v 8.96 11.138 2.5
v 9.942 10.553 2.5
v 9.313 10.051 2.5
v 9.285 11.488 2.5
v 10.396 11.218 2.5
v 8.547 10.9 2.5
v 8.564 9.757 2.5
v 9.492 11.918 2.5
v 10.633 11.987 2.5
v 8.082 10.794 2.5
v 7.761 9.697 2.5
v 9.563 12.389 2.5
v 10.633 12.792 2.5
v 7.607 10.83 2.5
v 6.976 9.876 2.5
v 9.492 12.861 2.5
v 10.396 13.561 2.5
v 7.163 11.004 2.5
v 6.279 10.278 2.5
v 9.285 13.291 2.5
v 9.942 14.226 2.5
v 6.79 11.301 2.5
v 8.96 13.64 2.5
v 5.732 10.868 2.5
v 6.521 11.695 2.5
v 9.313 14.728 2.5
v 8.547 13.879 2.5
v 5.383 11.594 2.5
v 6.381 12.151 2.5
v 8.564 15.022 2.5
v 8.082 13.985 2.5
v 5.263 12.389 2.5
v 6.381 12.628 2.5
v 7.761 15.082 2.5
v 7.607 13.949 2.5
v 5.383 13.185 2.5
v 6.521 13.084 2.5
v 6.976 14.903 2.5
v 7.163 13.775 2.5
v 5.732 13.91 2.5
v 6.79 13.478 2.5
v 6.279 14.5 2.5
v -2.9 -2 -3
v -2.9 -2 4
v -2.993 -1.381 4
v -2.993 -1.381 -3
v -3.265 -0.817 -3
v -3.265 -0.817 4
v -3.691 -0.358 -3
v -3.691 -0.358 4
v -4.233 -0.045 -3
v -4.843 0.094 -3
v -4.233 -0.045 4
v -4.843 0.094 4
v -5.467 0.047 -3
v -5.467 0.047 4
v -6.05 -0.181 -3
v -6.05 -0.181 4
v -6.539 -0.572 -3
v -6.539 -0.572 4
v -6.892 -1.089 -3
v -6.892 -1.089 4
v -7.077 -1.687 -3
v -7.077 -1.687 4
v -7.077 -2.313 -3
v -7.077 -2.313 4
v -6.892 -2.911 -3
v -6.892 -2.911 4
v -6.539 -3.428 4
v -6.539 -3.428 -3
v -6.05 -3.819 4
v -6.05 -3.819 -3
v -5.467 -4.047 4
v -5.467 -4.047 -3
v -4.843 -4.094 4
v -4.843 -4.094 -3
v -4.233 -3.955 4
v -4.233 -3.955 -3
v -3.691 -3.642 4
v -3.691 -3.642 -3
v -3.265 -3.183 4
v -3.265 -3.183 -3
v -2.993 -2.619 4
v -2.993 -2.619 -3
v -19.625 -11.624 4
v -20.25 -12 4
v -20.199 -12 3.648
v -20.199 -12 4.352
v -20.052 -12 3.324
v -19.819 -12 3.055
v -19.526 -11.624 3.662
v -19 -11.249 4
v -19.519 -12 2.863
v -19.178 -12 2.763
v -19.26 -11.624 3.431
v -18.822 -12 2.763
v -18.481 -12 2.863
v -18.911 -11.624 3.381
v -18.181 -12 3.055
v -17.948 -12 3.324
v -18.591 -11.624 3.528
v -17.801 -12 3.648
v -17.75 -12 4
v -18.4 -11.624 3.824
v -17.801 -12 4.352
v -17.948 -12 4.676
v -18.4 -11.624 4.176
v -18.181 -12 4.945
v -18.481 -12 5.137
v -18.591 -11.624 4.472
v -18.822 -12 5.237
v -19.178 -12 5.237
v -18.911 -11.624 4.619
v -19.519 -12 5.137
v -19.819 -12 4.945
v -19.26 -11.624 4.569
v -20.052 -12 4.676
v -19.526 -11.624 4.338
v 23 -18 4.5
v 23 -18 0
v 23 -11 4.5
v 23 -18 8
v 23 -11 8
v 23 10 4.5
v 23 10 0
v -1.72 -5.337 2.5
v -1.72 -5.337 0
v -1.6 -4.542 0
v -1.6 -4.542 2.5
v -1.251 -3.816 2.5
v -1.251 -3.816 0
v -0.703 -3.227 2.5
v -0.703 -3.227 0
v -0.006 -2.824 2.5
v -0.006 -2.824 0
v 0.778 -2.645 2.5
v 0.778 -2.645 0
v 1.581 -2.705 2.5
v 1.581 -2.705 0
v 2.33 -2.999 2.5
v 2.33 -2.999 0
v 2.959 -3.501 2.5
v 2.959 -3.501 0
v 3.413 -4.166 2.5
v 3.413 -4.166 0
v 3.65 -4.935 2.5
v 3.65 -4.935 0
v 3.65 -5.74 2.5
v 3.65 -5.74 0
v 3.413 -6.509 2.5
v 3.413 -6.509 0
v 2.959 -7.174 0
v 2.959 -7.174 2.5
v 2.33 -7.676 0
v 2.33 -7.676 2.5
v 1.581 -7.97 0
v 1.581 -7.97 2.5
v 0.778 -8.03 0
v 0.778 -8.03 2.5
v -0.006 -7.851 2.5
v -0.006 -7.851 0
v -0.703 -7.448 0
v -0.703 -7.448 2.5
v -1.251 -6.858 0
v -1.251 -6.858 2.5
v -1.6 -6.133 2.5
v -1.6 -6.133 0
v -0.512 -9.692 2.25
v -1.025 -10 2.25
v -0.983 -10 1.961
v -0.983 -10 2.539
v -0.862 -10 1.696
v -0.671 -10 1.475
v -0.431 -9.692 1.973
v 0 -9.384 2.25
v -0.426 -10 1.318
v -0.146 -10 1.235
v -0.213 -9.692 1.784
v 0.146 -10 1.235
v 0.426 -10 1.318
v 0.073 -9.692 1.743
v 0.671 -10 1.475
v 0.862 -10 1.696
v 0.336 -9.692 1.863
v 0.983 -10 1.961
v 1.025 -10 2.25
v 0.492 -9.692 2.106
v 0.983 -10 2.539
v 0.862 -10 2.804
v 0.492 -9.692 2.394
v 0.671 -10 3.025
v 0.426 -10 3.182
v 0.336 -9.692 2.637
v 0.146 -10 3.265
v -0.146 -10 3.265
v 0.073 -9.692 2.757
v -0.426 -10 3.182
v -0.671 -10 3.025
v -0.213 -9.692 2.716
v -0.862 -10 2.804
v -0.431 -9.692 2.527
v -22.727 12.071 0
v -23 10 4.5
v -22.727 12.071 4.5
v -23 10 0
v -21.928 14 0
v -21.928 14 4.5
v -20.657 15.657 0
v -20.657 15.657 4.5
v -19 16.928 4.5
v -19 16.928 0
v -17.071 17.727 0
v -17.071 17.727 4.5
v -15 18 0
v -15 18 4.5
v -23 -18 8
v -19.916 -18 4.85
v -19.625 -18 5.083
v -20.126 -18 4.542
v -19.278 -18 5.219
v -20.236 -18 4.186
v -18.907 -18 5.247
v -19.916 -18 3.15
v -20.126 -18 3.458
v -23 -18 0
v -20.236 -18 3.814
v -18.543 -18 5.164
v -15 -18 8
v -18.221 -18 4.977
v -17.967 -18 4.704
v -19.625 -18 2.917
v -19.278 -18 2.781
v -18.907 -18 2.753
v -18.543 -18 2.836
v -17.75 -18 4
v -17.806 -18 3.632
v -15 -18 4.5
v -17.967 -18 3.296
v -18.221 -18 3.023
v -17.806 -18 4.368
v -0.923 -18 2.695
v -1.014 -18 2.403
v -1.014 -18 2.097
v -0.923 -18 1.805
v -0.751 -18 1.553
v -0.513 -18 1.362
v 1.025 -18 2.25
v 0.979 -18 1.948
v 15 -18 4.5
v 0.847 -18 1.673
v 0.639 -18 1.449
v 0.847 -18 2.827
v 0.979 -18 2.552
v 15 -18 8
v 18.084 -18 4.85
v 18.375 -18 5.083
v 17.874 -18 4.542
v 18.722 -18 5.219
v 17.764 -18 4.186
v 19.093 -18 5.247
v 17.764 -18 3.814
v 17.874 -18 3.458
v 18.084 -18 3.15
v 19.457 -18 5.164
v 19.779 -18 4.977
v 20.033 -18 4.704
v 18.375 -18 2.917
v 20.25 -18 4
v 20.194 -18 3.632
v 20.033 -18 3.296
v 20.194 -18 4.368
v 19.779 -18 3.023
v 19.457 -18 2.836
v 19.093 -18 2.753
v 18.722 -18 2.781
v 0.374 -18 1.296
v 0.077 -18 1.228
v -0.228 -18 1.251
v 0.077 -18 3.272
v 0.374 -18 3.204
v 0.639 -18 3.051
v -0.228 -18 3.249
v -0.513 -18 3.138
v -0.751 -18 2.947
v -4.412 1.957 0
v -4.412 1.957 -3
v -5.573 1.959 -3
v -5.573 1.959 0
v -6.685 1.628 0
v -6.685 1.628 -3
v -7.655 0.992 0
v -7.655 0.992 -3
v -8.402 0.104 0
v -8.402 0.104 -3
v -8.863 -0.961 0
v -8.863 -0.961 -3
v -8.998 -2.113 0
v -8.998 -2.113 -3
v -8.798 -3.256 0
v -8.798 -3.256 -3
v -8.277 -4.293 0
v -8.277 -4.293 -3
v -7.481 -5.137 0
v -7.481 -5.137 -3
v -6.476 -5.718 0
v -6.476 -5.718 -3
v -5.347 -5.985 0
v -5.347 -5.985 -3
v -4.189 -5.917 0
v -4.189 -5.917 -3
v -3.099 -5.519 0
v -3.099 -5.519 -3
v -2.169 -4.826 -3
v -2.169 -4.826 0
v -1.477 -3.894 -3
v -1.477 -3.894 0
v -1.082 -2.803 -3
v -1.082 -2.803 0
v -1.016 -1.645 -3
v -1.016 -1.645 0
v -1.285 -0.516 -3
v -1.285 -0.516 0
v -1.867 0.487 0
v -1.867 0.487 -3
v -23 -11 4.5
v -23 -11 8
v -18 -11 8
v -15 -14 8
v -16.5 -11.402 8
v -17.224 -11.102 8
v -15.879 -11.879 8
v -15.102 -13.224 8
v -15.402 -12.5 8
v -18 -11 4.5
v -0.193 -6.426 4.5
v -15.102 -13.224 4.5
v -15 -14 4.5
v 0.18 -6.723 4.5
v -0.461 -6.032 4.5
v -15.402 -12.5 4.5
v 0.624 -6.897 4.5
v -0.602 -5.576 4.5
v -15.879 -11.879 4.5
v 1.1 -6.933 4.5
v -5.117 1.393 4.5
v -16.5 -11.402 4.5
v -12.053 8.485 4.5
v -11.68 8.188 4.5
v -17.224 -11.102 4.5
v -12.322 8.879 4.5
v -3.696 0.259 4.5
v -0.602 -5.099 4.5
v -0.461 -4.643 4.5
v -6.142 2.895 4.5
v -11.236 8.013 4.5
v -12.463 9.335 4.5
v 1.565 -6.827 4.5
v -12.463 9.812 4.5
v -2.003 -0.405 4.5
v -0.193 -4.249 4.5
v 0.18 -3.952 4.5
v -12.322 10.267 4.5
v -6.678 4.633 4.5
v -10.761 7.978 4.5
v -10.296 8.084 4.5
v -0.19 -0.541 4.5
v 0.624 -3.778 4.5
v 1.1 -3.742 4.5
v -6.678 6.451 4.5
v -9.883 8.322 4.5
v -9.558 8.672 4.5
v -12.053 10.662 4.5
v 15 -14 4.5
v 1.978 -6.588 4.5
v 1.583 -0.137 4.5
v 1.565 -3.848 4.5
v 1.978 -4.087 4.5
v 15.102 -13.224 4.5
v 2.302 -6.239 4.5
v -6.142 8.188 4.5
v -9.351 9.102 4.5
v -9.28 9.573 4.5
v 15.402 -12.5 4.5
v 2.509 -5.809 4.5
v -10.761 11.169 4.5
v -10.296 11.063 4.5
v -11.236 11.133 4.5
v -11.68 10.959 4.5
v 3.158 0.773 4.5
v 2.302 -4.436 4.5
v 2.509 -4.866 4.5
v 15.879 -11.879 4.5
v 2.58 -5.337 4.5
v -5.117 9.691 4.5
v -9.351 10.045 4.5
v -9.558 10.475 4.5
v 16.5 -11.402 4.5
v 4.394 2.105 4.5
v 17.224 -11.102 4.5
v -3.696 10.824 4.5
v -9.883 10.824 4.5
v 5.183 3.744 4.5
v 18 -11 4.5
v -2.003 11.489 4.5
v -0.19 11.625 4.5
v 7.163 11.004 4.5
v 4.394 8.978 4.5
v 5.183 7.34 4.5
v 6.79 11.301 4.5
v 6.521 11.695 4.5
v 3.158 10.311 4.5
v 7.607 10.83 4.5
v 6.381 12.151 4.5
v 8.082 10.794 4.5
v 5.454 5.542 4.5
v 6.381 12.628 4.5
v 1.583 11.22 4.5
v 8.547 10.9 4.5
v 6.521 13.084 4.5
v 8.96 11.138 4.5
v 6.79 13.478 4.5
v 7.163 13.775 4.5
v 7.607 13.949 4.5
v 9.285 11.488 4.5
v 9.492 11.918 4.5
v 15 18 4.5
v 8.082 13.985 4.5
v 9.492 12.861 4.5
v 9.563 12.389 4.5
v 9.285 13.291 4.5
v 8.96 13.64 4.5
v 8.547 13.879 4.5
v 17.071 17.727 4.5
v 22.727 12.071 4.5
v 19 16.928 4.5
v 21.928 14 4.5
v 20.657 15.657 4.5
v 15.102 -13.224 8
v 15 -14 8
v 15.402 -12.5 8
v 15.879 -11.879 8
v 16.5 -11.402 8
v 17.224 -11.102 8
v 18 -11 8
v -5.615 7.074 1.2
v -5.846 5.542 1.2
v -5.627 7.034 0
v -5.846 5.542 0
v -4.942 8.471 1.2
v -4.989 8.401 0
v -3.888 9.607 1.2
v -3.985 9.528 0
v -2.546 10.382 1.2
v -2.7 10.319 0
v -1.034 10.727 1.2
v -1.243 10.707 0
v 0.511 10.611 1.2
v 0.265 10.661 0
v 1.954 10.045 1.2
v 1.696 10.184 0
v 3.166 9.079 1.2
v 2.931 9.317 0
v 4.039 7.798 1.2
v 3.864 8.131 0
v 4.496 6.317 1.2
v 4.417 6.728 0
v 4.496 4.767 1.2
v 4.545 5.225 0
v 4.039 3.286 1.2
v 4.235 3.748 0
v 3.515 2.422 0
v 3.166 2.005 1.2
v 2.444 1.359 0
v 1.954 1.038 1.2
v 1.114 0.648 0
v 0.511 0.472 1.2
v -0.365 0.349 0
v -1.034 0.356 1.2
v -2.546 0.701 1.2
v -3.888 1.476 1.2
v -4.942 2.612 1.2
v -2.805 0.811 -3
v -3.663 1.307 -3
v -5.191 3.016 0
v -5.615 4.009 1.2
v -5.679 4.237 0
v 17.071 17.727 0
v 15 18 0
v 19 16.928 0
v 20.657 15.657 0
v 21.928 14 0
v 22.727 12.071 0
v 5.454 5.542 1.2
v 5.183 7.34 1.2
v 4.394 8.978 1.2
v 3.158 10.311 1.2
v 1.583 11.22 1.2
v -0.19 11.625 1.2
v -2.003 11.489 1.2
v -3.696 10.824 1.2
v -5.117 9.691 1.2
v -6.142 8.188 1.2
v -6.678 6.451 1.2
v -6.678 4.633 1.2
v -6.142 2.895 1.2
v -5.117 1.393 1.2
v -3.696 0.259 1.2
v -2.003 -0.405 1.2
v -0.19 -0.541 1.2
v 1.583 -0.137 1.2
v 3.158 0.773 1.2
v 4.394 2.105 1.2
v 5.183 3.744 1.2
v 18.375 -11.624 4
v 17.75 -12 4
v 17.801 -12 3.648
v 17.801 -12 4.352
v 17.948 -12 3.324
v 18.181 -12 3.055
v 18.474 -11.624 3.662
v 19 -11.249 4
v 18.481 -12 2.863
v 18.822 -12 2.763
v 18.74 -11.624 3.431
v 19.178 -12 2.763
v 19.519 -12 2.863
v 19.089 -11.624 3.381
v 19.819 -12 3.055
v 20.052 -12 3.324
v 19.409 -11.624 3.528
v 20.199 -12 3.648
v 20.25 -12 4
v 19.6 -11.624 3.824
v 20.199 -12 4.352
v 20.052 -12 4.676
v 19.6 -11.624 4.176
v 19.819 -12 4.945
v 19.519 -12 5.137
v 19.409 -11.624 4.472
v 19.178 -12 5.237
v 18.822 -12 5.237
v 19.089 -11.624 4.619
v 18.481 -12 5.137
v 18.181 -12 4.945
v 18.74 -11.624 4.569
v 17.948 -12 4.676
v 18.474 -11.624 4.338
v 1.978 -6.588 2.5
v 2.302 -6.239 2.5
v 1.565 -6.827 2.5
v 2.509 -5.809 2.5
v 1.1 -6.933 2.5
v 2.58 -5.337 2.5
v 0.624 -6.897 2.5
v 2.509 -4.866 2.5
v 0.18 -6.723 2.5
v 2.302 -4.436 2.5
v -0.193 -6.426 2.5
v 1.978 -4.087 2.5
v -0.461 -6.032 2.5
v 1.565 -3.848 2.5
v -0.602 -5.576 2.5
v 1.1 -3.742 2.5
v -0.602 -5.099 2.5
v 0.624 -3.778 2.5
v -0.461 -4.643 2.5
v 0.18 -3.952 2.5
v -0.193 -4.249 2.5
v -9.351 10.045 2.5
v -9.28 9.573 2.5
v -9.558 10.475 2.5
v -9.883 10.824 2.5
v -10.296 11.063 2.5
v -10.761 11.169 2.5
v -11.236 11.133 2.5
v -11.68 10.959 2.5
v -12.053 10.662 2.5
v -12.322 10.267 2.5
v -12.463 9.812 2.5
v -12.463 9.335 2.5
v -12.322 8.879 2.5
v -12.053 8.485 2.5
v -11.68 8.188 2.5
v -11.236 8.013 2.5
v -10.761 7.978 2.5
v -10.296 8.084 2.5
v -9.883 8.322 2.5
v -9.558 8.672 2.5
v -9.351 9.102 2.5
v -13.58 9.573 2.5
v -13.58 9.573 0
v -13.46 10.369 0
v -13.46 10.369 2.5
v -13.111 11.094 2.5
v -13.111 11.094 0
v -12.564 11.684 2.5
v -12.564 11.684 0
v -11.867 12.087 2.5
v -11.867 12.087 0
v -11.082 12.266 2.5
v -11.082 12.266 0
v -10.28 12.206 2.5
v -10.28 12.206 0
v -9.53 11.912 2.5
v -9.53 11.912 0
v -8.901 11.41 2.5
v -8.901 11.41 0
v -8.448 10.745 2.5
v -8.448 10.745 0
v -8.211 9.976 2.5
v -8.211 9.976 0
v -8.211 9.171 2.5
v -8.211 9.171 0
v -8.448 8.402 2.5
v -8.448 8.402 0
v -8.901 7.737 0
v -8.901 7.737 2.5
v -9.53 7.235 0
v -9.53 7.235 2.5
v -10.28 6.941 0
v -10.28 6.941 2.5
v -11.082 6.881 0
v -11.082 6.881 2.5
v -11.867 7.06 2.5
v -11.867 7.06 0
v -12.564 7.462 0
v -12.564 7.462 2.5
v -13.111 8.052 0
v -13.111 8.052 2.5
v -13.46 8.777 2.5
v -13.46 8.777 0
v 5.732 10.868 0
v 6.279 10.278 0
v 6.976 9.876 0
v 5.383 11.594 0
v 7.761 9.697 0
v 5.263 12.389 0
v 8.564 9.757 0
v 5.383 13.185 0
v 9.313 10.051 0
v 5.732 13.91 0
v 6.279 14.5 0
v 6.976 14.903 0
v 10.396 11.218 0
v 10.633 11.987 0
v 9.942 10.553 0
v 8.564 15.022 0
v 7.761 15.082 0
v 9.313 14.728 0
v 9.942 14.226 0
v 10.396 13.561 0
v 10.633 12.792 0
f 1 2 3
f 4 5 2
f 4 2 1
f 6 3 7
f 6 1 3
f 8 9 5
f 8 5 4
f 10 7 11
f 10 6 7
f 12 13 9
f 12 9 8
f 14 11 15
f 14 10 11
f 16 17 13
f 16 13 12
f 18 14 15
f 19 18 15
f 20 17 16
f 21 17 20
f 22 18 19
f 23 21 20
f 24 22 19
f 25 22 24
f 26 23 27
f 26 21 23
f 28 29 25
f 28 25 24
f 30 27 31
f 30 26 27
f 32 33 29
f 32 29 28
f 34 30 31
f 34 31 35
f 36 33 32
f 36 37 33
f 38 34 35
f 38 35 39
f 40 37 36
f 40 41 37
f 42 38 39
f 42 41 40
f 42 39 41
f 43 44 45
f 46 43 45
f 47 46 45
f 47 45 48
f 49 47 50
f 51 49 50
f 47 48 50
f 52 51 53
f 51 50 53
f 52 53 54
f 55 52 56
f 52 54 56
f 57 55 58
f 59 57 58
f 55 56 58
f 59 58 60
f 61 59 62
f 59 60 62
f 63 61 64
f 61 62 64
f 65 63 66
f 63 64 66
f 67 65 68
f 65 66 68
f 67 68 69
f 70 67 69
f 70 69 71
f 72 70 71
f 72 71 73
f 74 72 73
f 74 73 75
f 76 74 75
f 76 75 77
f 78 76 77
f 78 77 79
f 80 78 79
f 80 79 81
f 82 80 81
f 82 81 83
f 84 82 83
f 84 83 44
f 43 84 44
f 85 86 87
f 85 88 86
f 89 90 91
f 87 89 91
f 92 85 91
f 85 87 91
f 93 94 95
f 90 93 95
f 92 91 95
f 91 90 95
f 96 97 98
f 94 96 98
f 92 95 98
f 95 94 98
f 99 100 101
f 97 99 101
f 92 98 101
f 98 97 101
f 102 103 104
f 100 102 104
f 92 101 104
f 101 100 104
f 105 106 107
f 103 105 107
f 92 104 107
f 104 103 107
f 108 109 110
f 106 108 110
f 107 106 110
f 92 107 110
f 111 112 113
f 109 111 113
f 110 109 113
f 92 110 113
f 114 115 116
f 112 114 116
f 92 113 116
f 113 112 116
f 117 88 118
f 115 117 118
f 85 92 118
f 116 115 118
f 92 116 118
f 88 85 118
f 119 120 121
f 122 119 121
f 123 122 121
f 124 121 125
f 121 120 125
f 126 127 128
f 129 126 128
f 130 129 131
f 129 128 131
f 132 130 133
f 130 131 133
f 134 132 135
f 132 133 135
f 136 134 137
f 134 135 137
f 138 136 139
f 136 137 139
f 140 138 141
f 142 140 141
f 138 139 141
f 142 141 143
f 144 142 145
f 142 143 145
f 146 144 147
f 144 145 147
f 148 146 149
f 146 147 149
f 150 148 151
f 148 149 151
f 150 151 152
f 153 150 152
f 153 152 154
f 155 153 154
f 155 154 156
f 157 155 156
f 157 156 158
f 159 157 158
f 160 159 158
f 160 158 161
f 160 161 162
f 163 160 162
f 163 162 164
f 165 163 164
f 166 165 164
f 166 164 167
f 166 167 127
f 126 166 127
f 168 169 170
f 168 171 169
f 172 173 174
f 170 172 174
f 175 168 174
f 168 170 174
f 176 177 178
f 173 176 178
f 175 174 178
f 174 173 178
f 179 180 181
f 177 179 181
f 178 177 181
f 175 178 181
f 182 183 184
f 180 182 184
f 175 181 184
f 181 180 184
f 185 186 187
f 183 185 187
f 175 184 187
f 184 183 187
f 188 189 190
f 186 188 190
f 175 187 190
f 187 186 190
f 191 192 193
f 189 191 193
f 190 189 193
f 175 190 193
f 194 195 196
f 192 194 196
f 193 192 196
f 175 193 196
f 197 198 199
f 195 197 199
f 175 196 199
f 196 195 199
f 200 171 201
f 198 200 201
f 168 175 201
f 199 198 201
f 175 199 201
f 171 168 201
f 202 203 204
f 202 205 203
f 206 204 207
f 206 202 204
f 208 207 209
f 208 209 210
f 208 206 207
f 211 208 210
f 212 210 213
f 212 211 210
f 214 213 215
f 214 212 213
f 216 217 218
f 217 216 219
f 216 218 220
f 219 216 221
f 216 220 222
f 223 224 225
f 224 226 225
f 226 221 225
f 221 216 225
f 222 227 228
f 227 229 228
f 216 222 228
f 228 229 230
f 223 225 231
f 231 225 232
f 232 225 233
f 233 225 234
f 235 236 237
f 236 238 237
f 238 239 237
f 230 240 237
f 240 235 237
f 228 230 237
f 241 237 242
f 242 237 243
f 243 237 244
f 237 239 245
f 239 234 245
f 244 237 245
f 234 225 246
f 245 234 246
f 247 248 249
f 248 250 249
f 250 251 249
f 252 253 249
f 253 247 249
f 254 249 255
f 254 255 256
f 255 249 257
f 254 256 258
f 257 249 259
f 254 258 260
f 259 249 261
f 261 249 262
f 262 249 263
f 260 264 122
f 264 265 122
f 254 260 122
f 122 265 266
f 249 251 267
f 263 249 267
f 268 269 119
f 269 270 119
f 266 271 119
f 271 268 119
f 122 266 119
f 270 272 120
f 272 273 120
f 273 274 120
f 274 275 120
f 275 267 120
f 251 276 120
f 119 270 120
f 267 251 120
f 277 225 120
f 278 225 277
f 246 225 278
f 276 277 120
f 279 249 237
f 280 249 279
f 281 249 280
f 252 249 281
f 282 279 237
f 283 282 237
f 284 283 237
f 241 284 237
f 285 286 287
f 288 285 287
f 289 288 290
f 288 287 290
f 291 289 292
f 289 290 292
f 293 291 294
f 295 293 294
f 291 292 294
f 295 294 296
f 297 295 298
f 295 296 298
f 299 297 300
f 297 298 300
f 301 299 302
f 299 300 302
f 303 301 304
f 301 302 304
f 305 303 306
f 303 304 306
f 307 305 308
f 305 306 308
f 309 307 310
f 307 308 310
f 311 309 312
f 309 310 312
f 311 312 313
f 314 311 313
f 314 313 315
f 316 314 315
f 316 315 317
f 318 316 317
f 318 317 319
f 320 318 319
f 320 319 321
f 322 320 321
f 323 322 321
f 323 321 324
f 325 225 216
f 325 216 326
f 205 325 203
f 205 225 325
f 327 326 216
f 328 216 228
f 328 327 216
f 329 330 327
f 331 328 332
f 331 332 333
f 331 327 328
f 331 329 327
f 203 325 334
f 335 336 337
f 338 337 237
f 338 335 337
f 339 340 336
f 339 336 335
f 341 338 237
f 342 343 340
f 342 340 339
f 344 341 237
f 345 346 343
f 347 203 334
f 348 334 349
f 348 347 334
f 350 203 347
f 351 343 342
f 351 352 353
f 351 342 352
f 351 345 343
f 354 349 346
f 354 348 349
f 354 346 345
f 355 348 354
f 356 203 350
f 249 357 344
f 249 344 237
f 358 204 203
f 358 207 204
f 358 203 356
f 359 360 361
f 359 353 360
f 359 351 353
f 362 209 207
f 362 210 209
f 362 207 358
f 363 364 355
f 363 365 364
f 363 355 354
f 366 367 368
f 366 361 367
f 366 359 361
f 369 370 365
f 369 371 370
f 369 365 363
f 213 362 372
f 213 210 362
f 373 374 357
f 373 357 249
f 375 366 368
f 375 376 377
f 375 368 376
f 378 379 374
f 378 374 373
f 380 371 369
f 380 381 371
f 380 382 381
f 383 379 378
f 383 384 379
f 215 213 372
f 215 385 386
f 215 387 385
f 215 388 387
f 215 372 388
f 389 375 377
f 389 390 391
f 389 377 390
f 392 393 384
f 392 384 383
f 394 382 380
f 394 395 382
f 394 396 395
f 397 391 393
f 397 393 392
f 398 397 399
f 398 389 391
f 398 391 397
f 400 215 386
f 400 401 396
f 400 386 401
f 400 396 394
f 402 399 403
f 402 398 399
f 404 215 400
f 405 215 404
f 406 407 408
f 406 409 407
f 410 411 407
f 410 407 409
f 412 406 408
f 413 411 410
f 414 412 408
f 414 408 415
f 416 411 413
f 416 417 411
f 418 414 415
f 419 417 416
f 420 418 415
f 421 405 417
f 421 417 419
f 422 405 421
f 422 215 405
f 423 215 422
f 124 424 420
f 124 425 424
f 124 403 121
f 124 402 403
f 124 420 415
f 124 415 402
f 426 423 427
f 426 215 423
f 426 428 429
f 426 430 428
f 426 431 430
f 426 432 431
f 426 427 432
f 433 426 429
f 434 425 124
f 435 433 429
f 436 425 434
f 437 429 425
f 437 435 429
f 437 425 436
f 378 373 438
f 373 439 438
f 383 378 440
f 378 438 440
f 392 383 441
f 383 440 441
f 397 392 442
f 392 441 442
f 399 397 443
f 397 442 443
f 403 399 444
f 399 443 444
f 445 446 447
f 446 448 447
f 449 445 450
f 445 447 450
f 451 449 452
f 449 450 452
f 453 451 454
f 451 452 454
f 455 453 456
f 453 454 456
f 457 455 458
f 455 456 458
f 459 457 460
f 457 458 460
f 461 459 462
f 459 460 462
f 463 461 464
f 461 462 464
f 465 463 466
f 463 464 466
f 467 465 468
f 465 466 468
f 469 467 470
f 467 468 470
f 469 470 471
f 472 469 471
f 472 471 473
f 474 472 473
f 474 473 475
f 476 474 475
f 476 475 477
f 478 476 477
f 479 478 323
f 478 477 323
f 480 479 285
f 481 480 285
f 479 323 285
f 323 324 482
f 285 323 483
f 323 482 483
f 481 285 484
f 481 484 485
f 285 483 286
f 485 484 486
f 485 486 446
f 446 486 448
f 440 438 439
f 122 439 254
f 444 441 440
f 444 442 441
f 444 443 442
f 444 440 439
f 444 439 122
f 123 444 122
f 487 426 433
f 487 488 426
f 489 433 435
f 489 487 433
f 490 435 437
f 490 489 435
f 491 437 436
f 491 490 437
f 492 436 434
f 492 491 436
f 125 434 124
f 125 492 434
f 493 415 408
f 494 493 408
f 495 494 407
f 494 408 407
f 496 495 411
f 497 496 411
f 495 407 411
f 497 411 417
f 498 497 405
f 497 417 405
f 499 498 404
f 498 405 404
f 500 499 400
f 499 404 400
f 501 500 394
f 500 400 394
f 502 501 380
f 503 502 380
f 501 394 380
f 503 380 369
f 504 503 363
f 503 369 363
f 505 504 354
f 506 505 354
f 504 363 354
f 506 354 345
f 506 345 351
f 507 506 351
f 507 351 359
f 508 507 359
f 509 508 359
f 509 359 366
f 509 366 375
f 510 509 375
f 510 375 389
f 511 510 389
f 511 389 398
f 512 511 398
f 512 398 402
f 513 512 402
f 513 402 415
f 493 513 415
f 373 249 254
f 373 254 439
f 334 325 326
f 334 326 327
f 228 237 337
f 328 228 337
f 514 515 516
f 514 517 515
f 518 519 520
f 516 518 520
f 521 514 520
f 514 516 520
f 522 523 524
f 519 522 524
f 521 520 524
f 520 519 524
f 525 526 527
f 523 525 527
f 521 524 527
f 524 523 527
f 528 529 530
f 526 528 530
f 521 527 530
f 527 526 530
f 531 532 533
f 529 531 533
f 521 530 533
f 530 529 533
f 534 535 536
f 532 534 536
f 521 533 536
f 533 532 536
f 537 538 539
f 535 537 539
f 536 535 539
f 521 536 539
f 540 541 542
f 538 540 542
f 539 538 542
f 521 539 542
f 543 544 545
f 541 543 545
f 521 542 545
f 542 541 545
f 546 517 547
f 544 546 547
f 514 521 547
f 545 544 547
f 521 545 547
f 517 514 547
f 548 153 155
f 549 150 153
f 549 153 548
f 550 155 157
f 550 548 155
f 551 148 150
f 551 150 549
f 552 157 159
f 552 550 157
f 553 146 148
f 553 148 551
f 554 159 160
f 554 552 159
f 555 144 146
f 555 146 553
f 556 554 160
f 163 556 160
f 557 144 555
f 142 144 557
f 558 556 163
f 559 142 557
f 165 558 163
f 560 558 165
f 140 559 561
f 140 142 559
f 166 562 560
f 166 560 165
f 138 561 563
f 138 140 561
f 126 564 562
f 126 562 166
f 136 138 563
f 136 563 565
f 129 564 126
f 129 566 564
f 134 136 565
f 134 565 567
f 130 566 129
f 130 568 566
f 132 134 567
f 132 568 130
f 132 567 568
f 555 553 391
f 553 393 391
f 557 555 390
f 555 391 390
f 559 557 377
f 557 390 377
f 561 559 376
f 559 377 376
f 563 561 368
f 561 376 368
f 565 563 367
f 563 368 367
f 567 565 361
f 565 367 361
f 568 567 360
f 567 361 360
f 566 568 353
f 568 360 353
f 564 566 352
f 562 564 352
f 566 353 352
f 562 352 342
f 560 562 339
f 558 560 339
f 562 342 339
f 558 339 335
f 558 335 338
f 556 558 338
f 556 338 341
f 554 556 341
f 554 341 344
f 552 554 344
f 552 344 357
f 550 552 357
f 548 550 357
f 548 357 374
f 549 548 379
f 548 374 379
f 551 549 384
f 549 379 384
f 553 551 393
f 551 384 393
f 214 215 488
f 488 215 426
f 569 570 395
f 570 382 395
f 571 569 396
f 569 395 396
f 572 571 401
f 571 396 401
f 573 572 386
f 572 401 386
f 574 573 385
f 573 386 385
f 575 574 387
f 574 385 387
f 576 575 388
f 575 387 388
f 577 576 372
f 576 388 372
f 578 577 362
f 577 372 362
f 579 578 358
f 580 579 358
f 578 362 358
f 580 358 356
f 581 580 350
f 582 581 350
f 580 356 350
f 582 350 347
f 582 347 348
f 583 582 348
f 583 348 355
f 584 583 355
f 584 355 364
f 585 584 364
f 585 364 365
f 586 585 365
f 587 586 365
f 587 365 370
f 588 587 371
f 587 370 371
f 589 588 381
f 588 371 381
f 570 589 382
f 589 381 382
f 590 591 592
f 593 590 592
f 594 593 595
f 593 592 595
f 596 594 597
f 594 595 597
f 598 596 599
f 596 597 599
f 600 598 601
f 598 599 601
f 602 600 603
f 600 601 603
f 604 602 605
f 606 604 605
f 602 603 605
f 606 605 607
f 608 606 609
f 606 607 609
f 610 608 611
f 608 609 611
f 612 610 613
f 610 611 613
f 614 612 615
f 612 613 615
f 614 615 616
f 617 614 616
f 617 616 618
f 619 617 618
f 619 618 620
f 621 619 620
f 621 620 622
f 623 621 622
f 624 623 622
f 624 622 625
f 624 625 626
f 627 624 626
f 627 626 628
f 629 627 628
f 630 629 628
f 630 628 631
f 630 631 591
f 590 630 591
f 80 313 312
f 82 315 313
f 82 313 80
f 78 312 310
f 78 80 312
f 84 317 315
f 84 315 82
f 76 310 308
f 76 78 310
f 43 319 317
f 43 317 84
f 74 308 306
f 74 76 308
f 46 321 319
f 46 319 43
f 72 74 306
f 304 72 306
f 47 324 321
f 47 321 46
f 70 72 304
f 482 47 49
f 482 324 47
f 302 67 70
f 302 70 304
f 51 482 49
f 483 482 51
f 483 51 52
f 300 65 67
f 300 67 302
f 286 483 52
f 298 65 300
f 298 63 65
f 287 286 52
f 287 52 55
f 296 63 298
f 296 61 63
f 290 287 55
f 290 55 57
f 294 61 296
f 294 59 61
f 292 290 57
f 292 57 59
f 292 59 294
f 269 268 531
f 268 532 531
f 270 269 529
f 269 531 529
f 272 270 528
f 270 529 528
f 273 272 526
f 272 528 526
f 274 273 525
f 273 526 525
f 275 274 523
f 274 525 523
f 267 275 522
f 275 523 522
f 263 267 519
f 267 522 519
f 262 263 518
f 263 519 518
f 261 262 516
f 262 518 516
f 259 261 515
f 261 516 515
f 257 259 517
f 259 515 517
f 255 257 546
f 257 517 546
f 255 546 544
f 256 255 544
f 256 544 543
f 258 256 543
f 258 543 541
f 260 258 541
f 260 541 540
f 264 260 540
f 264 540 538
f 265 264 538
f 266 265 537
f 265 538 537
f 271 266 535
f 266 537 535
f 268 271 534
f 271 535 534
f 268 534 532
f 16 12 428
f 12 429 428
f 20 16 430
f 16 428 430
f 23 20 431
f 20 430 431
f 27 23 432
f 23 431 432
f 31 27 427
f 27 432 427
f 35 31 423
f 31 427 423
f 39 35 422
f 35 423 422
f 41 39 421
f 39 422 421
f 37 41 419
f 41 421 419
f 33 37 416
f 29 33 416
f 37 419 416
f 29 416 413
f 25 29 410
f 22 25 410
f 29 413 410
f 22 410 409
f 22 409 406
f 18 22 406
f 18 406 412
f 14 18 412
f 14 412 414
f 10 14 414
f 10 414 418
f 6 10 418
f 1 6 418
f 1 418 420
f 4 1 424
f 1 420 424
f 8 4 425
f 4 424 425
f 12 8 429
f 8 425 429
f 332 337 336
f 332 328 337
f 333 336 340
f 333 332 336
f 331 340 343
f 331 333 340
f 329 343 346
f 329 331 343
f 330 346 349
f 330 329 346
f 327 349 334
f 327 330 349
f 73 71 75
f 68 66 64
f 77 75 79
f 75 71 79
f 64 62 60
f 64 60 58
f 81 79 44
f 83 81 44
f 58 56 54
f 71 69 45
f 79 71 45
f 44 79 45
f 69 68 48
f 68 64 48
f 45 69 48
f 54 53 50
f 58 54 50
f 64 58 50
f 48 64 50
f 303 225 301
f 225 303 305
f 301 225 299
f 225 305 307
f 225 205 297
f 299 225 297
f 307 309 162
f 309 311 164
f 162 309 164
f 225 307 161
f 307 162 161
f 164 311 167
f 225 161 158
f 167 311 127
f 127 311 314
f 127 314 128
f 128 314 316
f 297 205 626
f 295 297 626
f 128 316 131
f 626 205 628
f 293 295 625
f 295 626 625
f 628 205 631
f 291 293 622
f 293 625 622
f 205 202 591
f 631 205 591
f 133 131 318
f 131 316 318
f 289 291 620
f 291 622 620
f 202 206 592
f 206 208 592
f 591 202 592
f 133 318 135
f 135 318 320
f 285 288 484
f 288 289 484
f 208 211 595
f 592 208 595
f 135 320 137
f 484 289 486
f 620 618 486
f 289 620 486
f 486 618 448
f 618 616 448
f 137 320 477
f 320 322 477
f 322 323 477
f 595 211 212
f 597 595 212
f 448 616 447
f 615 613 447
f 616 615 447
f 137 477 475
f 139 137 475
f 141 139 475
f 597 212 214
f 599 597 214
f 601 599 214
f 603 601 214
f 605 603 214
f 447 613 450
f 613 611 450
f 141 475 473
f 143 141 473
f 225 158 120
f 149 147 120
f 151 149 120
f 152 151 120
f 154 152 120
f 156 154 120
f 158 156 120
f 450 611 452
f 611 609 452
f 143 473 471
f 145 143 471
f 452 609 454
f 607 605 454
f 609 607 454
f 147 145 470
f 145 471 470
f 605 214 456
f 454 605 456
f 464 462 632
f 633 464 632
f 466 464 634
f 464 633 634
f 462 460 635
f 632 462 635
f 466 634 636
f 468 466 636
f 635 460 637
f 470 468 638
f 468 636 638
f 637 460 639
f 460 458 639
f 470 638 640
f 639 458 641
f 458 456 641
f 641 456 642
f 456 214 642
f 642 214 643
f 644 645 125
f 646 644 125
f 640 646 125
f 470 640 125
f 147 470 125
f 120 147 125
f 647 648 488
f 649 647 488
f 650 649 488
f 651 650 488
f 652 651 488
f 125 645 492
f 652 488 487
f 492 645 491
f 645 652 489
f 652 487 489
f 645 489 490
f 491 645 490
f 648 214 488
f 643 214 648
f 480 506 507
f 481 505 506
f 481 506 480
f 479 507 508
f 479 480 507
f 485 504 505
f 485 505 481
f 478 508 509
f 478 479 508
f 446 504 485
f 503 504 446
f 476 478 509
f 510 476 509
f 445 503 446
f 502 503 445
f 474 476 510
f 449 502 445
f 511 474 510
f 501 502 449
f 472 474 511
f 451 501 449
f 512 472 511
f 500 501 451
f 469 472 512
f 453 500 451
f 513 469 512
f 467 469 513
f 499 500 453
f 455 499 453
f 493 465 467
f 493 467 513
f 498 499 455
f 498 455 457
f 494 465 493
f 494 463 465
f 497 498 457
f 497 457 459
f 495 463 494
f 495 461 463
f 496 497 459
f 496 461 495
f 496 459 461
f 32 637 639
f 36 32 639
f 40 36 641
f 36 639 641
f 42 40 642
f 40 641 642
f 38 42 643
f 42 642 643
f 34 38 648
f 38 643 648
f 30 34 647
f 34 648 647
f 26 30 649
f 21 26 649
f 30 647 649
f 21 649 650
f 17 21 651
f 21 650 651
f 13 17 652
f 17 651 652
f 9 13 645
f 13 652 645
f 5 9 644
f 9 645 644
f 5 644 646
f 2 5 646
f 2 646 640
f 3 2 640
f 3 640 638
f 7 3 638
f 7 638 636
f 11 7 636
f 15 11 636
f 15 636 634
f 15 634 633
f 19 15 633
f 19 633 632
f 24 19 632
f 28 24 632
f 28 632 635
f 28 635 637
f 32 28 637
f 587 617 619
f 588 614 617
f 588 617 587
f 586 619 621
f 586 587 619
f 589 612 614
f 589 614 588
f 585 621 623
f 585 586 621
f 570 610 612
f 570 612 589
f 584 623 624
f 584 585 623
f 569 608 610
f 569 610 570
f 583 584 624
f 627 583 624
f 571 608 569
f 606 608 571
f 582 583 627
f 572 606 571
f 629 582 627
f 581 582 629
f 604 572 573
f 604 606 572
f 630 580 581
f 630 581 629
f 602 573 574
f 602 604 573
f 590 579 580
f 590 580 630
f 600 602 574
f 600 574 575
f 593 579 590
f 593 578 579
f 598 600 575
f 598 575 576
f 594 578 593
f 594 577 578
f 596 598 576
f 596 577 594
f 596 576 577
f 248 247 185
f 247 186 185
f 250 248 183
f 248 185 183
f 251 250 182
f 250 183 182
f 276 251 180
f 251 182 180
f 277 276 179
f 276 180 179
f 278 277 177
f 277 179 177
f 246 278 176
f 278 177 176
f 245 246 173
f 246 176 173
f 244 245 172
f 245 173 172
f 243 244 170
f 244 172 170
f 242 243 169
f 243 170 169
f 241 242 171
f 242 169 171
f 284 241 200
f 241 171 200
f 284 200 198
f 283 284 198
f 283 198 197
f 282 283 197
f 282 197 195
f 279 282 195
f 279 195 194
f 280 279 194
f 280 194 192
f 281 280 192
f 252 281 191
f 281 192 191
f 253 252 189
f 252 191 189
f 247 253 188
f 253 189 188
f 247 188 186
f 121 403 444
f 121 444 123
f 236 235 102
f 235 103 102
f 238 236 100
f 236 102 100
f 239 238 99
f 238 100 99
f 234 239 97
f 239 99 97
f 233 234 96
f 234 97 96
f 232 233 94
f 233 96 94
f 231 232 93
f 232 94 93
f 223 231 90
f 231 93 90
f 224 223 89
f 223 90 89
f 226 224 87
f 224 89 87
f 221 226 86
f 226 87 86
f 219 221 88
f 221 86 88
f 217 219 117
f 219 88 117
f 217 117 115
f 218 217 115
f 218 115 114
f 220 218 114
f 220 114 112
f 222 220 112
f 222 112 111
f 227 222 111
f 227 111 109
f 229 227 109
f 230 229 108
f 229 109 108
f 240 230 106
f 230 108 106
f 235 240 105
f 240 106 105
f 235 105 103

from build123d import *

# Parameters (mm, degrees)
SKETCH1_W                                        = 46
SKETCH1_H                                        = 36
BOSS_EXTRUDE1_DEPTH                              = 4.5
SKETCH2_W                                        = 8
SKETCH2_H                                        = 7
BOSS_EXTRUDE2_DEPTH                              = 3.5
SKETCH3_W                                        = 7.999999995
SKETCH3_H                                        = 7
BOSS_EXTRUDE3_DEPTH                              = 3.5
SKETCH4_W                                        = 4
SKETCH4_H                                        = 3
F_2_05_2_05_DIAMETER_HOLE1_D                     = 2.05
F_2_05_2_05_DIAMETER_HOLE1_DEPTH                 = 8
F_2_05_2_05_DIAMETER_HOLE1_TIP                   = 0.615882135
F_2_5_2_5_DIAMETER_HOLE1_D                       = 2.5
F_2_5_2_5_DIAMETER_HOLE1_DEPTH                   = 6
F_2_5_2_5_DIAMETER_HOLE1_TIP                     = 0.751075774
CBORE_FOR_M3_HEX_HEAD_MACHINE_SCREW1_D           = 3.2
CBORE_FOR_M3_HEX_HEAD_MACHINE_SCREW1_DEPTH       = 8.000025
CBORE_FOR_M3_HEX_HEAD_MACHINE_SCREW1_CBORE_D     = 5.4
CBORE_FOR_M3_HEX_HEAD_MACHINE_SCREW1_CBORE_DEPTH = 2.5
HOLE1_D                                          = 10.4
HOLE1_CBORE_D                                    = 12.2
HOLE1_CBORE_DEPTH                                = 3.3
F_4_2_4_2_DIAMETER_HOLE1_D                       = 4.2
F_4_2_4_2_DIAMETER_HOLE1_DEPTH                   = 7
FILLET1_R                                        = 3
FILLET2_R                                        = 8


with BuildPart() as part:
    # Sketch1 → Boss-Extrude1 (new body)
    with BuildSketch(Plane.XY.offset(4.5)):
        Rectangle(SKETCH1_W, SKETCH1_H)
    extrude(amount=-BOSS_EXTRUDE1_DEPTH)

    # Sketch2 → Boss-Extrude2 (add)
    with BuildSketch(Plane.XY.offset(4.5)):
        with Locations((-19, -14.5)):
            Rectangle(SKETCH2_W, SKETCH2_H)
    extrude(amount=BOSS_EXTRUDE2_DEPTH)

    # Sketch3 → Boss-Extrude3 (add)
    with BuildSketch(Plane.XY.offset(4.5)):
        with Locations((19.000000003, -14.5)):
            Rectangle(SKETCH3_W, SKETCH3_H)
    extrude(amount=BOSS_EXTRUDE3_DEPTH)

    # Sketch4 → Revolve1 (revolve)
    with BuildSketch(Plane(origin=(0, -2, 0), x_dir=(1, 0, 0), z_dir=(0, 1, 0))):
        with Locations((-3, 1.5)):
            Rectangle(SKETCH4_W, SKETCH4_H)
    revolve(axis=Axis((-5, -2, -3), (0, 0, 1)))

    # Ø2.05 (2.05) Diameter Hole1
    with Locations(Plane(origin=(0, -18, 0), x_dir=(-1, 0, 0), z_dir=(0, -1, 0))):
        with Locations((0, -2.25)):
            Hole(F_2_05_2_05_DIAMETER_HOLE1_D / 2, depth=F_2_05_2_05_DIAMETER_HOLE1_DEPTH)
            with Locations((0, 0, -(F_2_05_2_05_DIAMETER_HOLE1_DEPTH + F_2_05_2_05_DIAMETER_HOLE1_TIP / 2))):  # 118° drill point
                Cone(0, F_2_05_2_05_DIAMETER_HOLE1_D / 2, F_2_05_2_05_DIAMETER_HOLE1_TIP, mode=Mode.SUBTRACT)

    # Ø2.5 (2.5) Diameter Hole1
    with Locations(Plane(origin=(0, -18, 0), x_dir=(-1, 0, 0), z_dir=(0, -1, 0))):
        with Locations((19, -4), (-19, -4)):
            Hole(F_2_5_2_5_DIAMETER_HOLE1_D / 2, depth=F_2_5_2_5_DIAMETER_HOLE1_DEPTH)
            with Locations((0, 0, -(F_2_5_2_5_DIAMETER_HOLE1_DEPTH + F_2_5_2_5_DIAMETER_HOLE1_TIP / 2))):  # 118° drill point
                Cone(0, F_2_5_2_5_DIAMETER_HOLE1_D / 2, F_2_5_2_5_DIAMETER_HOLE1_TIP, mode=Mode.SUBTRACT)

    # CBORE for M3 Hex Head Machine Screw1
    with Locations(Plane(origin=(0, 0, 0), x_dir=(-1, 0, 0), z_dir=(0, 0, -1))):
        with Locations((-7.962908944, 12.389389916), (10.88037403, 9.573242407), (-0.980122741, -5.337445584)):
            CounterBoreHole(CBORE_FOR_M3_HEX_HEAD_MACHINE_SCREW1_D / 2, CBORE_FOR_M3_HEX_HEAD_MACHINE_SCREW1_CBORE_D / 2, CBORE_FOR_M3_HEX_HEAD_MACHINE_SCREW1_CBORE_DEPTH, depth=CBORE_FOR_M3_HEX_HEAD_MACHINE_SCREW1_DEPTH)

    # Hole1 (through all)
    with Locations(Plane.XY.offset(4.5)):
        with Locations((-0.645780782, 5.541728913)):
            CounterBoreHole(HOLE1_D / 2, HOLE1_CBORE_D / 2, HOLE1_CBORE_DEPTH)

    # Ø4.2 (4.2) Diameter Hole1
    with Locations(Plane(origin=(0, 0, -3), x_dir=(-1, 0, 0), z_dir=(0, 0, -1))):
        with Locations((5, -2)):
            Hole(F_4_2_4_2_DIAMETER_HOLE1_D / 2, depth=F_4_2_4_2_DIAMETER_HOLE1_DEPTH)

    # Fillet1
    fillet1_edges = [part.edges().sort_by_distance(p)[0] for p in [
        (-15, -11, 6.25),
        (15.000000005, -11, 6.25),
    ]]
    fillet(fillet1_edges, radius=FILLET1_R)

    # Fillet2
    fillet2_edges = [part.edges().sort_by_distance(p)[0] for p in [
        (23, 18, 2.25),
        (-23, 18, 2.25),
    ]]
    fillet(fillet2_edges, radius=FILLET2_R)


solid = part.part
